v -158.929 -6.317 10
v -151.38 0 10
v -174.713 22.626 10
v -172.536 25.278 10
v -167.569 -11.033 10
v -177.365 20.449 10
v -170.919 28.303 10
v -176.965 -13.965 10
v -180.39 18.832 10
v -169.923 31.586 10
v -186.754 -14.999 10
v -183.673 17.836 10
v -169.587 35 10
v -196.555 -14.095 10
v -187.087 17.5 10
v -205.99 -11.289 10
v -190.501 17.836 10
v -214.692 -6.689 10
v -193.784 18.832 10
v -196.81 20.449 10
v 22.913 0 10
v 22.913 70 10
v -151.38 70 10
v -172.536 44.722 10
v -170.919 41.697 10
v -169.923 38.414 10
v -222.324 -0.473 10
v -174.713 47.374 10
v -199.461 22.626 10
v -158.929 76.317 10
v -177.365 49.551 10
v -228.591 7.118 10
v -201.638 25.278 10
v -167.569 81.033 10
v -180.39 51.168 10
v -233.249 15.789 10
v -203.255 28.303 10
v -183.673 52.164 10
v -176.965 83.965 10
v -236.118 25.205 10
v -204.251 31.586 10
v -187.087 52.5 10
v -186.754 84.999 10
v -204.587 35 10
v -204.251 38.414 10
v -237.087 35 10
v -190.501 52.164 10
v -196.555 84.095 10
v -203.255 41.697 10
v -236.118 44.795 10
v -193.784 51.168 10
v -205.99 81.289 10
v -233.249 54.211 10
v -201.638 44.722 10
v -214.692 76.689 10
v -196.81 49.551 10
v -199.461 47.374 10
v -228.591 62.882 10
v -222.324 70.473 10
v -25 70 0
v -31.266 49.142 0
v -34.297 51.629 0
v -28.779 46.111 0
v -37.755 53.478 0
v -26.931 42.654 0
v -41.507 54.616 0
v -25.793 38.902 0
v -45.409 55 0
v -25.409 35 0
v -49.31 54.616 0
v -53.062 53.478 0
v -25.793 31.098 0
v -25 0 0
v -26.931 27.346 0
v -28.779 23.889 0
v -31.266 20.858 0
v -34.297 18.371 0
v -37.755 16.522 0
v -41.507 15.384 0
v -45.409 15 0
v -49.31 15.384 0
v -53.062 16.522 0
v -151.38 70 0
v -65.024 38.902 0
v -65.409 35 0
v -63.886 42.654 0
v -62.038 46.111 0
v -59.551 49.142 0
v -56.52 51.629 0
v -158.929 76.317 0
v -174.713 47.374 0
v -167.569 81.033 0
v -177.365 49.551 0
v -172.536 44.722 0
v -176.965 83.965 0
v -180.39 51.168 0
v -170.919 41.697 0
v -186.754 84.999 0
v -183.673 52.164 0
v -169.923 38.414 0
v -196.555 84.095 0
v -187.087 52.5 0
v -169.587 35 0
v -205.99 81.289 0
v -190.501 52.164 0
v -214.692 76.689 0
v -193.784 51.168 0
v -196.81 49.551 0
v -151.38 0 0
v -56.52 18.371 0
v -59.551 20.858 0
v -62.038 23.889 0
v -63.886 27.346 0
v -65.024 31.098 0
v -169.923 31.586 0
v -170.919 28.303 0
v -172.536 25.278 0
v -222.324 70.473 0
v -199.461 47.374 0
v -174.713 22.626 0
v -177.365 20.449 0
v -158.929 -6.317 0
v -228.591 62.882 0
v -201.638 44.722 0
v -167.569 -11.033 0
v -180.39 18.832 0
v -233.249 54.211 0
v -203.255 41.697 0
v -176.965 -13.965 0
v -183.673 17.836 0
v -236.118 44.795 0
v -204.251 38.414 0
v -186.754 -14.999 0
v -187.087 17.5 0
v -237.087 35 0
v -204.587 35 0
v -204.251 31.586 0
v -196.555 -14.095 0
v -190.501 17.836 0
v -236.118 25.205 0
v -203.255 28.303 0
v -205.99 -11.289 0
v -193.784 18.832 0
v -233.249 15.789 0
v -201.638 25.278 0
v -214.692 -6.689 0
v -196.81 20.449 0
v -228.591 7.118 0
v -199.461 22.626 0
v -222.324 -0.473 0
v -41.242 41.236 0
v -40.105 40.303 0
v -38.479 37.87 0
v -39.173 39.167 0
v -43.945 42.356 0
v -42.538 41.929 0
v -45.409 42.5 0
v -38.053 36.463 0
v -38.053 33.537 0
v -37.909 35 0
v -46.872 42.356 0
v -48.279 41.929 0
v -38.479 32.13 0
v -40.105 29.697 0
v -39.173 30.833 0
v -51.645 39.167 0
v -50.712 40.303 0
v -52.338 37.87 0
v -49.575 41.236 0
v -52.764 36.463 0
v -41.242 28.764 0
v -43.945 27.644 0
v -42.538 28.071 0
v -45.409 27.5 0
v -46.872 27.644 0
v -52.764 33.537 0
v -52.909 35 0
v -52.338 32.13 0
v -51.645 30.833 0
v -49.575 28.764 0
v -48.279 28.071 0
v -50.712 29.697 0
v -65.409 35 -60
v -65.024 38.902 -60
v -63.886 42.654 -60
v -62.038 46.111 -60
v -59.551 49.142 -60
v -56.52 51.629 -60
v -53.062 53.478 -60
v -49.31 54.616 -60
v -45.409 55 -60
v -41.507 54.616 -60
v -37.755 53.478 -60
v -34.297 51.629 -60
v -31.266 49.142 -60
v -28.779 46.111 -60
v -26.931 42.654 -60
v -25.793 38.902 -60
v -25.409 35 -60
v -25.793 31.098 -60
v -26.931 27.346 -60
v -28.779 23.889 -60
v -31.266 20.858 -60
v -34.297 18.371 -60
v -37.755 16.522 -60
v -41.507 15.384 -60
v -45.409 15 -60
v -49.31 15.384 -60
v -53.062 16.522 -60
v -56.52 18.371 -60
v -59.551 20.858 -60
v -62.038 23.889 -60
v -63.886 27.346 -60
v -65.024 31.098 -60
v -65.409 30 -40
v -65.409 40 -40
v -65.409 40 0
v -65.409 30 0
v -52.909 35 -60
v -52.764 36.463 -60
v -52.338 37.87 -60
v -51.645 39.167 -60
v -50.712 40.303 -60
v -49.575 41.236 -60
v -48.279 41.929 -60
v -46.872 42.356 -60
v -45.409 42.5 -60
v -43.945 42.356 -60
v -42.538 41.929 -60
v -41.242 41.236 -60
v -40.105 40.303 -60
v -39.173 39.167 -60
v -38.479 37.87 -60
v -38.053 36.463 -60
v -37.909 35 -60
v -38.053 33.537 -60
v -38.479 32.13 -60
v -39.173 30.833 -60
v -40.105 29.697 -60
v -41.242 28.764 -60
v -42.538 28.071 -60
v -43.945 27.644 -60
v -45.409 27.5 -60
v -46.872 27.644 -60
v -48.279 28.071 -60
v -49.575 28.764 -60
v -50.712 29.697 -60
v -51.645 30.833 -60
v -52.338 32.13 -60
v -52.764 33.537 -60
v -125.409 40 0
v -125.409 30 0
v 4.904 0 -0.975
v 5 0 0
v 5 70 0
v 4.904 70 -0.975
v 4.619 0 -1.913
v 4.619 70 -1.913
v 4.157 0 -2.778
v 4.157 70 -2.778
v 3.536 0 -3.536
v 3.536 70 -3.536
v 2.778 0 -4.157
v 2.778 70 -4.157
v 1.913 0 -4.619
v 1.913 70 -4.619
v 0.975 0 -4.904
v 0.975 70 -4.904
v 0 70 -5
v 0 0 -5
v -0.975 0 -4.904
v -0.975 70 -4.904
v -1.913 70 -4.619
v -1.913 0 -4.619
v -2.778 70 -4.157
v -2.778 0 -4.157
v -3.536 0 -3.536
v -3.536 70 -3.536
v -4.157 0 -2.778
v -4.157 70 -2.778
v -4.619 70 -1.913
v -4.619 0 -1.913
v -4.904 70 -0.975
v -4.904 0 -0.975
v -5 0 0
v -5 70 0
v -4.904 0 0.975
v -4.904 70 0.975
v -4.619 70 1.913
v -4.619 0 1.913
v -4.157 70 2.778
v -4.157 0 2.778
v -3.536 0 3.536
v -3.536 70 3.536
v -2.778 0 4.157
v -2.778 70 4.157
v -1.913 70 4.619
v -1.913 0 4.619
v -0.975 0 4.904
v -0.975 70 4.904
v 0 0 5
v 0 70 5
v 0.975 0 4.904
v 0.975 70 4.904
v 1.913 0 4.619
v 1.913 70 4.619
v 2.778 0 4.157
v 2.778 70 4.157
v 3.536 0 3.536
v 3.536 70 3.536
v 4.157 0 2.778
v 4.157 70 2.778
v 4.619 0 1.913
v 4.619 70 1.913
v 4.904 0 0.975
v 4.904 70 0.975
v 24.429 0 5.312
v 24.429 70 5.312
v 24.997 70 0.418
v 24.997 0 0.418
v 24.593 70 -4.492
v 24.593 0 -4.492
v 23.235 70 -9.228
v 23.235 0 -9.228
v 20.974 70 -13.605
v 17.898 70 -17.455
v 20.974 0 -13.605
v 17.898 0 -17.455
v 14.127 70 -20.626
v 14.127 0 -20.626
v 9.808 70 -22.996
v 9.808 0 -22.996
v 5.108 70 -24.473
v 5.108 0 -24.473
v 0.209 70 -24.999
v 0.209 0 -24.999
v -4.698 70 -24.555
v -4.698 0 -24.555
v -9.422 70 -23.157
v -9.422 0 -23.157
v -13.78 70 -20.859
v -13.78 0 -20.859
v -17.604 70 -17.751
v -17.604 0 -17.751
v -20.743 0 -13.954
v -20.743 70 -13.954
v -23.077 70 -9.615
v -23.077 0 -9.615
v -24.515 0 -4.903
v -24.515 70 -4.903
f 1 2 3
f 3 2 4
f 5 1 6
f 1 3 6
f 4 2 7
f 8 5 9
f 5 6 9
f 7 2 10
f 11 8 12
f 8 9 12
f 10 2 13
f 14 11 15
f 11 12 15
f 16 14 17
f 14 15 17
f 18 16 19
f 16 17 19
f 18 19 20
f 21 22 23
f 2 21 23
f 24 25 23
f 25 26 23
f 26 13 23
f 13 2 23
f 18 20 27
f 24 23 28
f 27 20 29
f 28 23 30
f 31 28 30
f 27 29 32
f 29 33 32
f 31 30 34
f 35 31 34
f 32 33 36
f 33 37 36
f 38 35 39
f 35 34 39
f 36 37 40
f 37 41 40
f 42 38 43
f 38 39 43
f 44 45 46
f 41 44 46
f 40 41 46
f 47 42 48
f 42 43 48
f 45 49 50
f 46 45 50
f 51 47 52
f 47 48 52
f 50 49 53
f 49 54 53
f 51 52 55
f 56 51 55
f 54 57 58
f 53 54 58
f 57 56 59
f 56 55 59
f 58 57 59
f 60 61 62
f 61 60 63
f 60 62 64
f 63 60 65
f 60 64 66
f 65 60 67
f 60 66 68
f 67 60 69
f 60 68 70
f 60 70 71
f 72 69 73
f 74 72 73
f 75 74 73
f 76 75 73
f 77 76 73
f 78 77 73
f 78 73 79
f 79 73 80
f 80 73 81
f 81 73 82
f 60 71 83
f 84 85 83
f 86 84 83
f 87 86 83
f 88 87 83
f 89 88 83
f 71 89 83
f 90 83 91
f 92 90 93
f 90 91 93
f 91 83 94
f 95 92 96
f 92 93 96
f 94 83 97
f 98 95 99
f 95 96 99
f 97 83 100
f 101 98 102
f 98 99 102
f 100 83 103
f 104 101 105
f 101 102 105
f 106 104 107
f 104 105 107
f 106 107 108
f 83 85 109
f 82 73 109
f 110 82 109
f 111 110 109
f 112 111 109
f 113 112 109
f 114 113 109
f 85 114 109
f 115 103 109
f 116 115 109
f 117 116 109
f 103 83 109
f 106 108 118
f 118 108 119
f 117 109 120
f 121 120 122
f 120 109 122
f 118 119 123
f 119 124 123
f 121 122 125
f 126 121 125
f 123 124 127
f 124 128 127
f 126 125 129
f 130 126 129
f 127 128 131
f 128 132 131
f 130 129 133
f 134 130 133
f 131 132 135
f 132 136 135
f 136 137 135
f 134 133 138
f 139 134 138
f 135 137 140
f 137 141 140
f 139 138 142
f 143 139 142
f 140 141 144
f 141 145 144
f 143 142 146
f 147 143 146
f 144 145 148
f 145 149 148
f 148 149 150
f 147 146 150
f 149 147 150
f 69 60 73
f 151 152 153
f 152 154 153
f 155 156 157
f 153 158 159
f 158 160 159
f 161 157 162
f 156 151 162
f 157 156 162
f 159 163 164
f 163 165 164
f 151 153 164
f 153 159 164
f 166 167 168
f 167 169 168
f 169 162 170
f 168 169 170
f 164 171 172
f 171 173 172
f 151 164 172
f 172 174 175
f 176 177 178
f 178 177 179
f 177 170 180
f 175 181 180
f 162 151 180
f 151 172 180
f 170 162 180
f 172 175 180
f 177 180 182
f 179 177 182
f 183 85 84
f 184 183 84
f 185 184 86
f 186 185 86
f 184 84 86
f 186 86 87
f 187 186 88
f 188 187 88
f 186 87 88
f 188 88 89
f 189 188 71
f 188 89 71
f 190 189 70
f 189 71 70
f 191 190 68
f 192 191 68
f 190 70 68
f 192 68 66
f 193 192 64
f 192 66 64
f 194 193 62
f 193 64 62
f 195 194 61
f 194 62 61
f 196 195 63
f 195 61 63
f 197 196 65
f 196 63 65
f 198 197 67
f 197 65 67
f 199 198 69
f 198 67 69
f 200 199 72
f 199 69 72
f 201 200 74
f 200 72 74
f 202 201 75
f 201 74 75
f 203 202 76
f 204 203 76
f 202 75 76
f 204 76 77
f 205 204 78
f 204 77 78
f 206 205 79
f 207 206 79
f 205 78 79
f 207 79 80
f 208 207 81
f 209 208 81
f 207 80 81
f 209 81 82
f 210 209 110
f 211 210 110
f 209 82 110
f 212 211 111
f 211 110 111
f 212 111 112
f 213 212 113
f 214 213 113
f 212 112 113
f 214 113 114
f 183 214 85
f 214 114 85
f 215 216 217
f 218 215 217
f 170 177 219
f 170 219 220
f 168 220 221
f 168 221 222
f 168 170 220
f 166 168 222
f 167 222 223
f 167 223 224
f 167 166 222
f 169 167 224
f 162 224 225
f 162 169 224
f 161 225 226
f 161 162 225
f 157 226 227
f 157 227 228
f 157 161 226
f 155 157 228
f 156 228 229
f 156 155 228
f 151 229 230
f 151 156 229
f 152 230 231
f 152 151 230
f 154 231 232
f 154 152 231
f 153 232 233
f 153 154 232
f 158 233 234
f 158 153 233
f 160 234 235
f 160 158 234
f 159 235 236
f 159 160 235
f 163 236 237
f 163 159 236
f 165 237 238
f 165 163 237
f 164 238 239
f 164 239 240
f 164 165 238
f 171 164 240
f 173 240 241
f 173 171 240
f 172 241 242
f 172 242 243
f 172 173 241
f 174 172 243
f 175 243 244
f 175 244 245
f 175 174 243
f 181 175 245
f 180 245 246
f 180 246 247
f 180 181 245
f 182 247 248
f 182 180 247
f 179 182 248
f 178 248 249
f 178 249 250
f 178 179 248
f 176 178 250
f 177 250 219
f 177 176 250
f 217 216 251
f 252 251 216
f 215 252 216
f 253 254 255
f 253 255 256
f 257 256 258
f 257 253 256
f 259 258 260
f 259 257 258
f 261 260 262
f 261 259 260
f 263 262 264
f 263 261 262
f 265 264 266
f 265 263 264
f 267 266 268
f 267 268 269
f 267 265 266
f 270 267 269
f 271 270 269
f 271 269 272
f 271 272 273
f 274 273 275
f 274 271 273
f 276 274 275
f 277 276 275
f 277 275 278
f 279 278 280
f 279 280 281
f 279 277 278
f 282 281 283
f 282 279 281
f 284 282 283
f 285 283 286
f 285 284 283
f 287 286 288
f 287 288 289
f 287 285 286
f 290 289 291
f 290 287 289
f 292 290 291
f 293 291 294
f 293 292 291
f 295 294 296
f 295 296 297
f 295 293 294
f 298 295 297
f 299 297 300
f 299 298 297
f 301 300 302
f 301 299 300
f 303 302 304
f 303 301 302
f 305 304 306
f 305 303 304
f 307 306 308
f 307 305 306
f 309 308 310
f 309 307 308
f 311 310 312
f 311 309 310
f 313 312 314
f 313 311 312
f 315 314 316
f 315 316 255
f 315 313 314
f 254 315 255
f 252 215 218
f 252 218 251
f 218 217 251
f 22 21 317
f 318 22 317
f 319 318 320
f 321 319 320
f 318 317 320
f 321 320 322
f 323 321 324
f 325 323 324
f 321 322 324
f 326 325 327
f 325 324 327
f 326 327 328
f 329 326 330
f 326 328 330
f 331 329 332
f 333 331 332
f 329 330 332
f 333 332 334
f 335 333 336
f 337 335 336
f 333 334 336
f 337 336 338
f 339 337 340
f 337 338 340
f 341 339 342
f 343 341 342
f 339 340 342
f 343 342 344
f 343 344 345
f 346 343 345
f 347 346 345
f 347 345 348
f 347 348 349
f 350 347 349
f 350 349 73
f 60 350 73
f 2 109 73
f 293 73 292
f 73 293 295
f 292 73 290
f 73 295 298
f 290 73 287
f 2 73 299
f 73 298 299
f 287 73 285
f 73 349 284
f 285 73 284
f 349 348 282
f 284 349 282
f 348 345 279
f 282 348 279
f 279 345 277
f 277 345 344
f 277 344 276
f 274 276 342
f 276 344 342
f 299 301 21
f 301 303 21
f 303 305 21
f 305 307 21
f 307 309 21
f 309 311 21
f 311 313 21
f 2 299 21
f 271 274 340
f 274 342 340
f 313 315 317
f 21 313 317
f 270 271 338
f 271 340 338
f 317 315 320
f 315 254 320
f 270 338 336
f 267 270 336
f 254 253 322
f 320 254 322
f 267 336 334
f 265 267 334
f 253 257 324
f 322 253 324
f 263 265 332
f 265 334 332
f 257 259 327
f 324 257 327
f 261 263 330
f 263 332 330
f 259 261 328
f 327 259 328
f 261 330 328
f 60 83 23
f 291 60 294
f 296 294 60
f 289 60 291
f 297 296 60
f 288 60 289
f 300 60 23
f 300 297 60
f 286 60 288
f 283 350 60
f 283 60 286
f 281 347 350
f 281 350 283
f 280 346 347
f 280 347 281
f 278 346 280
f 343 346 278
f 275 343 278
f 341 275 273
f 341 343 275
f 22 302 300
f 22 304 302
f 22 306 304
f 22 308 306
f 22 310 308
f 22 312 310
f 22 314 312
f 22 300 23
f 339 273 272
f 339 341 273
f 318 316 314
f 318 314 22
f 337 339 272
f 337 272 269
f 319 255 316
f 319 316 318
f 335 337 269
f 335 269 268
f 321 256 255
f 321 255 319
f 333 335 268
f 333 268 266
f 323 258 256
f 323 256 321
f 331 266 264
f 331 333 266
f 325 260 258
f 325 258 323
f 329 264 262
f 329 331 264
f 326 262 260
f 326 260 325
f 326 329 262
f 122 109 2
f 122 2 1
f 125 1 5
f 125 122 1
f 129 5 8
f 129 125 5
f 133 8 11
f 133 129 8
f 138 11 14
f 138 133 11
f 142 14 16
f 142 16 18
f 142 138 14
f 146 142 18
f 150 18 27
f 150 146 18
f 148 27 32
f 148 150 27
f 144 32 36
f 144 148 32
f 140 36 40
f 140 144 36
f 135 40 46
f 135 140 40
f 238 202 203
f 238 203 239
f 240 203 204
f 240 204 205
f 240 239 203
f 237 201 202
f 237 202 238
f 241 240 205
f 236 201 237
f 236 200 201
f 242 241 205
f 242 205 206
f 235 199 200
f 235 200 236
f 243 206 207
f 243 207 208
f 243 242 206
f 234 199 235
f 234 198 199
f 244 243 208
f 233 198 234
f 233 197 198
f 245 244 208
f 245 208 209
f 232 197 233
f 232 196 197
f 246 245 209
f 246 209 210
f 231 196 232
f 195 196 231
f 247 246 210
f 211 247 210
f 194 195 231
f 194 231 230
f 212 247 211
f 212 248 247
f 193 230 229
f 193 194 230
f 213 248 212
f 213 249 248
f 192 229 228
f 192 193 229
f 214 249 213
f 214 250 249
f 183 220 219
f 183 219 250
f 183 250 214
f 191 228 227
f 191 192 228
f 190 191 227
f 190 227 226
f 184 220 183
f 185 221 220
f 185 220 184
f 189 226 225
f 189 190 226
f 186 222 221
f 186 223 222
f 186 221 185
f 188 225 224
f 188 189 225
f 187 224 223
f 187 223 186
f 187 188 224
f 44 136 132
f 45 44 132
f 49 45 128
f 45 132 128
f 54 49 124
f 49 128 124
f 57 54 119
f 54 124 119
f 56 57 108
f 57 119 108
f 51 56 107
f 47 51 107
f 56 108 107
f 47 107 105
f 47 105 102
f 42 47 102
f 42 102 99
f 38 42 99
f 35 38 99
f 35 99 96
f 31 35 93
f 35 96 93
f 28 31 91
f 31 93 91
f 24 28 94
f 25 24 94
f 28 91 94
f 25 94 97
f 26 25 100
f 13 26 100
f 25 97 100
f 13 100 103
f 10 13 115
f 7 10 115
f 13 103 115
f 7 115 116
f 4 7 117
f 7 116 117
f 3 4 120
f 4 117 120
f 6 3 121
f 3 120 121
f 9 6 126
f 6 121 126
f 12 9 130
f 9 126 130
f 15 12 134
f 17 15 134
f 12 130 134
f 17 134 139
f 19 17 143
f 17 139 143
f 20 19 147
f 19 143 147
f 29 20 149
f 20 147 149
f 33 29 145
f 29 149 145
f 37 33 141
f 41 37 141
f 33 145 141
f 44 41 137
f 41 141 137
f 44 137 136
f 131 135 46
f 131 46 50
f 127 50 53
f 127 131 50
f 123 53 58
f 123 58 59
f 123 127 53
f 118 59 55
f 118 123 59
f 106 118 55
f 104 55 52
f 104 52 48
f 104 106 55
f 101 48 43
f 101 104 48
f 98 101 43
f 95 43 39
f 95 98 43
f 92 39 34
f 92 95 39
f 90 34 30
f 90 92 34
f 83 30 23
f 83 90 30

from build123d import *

# Parameters (mm, degrees)
SKETCH1_R           = 5
BOSS_EXTRUDE2_DEPTH = 70
BOSS_EXTRUDE3_DEPTH = 10
SKETCH4_R           = 17.5
CUT_EXTRUDE1_DEPTH  = 10
SKETCH5_R           = 20
SKETCH5_R_2         = 7.5
BOSS_EXTRUDE4_DEPTH = 60
BOSS_EXTRUDE9_DEPTH = 5


with BuildPart() as part:
    # Sketch1 → Boss-Extrude2 (new body)
    with BuildSketch(Plane(origin=(0, 0, 0), x_dir=(1, 0, 0), z_dir=(0, 1, 0))):
        with BuildLine():
            Line((-25, 0), (-187.087121525, 0))
            Line((-187.087121525, 0), (-187.087121525, -10))
            Line((-187.087121525, -10), (22.912878475, -10))
            ThreePointArc((22.912878475, -10), (5.107741092, 24.472657823), (-25, 0))
        make_face()
        Circle(SKETCH1_R, mode=Mode.SUBTRACT)
    extrude(amount=BOSS_EXTRUDE2_DEPTH)

    # Sketch3 → Boss-Extrude3 (add)
    with BuildSketch(Plane(origin=(0, 0, 0), x_dir=(-1, 0, 0), z_dir=(0, 0, -1))):
        with BuildLine():
            ThreePointArc((151.379979383, 70), (137.087121525, 35), (151.379979383, 0))
            Line((151.379979383, 0), (187.087121525, 0))
            Line((187.087121525, 0), (187.087121525, 70))
            Line((187.087121525, 70), (151.379979383, 70))
        make_face()
        with BuildLine():
            Line((187.087121525, 0), (151.379979383, 0))
            ThreePointArc((151.379979383, 0), (205.990069614, -11.289075964), (237.087121525, 35))
            ThreePointArc((237.087121525, 35), (205.990069614, 81.289075964), (151.379979383, 70))
            Line((151.379979383, 70), (187.087121525, 70))
            Line((187.087121525, 70), (187.087121525, 0))
        make_face()
    extrude(amount=-BOSS_EXTRUDE3_DEPTH)

    # Sketch4 → Cut-Extrude1 (cut)
    with BuildSketch(Plane(origin=(0, 0, 0), x_dir=(-1, 0, 0), z_dir=(0, 0, -1))):
        with Locations((187.087121525, 35)):
            Circle(SKETCH4_R)
    extrude(amount=-CUT_EXTRUDE1_DEPTH, mode=Mode.SUBTRACT)

    # Sketch5 → Boss-Extrude4 (add)
    with BuildSketch(Plane(origin=(0, 0, 0), x_dir=(-1, 0, 0), z_dir=(0, 0, -1))):
        with Locations((45.40859007, 35)):
            Circle(SKETCH5_R)
        with Locations((45.40859007, 35)):
            Circle(SKETCH5_R_2, mode=Mode.SUBTRACT)
    extrude(amount=BOSS_EXTRUDE4_DEPTH)


with BuildPart() as body_2:
    # Sketch7 → Boss-Extrude9 (new body, symmetric)
    with BuildSketch(Plane(origin=(0, 35, 0), x_dir=(1, 0, 0), z_dir=(0, 1, 0))):
        Polygon((-65.40859007, 40), (-65.40859007, 0), (-125.40859007, 0), align=None)
    extrude(amount=BOSS_EXTRUDE9_DEPTH, both=True)


solid = Compound([part.part, body_2.part])
